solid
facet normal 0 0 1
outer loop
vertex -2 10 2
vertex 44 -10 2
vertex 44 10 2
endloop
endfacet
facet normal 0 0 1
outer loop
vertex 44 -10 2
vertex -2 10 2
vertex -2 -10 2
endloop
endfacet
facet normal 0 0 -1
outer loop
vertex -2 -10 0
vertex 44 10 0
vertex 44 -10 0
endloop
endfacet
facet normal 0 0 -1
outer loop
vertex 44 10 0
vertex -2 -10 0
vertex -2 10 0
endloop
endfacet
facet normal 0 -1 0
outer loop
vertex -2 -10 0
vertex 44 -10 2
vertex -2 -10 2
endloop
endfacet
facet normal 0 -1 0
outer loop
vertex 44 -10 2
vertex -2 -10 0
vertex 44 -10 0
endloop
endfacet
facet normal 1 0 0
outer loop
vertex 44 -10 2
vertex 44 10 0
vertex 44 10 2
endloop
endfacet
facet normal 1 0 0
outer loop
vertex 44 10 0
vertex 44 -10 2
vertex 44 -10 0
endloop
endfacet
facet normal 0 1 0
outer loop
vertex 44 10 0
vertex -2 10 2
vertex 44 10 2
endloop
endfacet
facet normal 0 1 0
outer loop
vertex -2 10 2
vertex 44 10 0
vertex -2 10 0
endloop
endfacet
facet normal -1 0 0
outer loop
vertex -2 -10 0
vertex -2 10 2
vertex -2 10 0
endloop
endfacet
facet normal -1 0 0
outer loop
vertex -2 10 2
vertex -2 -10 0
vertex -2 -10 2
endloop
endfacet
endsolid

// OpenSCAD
 
scale([0.1, 0.1, 0.5]) {
linear_extrude(height = 6, center = false, convexity = 10, twist = 0)
import(file="//home/sean/lola-logo.dxf", convexity=3);
translate(v = [-20, -100, 0])
cube(size = [460,200,4], center=false);
}
